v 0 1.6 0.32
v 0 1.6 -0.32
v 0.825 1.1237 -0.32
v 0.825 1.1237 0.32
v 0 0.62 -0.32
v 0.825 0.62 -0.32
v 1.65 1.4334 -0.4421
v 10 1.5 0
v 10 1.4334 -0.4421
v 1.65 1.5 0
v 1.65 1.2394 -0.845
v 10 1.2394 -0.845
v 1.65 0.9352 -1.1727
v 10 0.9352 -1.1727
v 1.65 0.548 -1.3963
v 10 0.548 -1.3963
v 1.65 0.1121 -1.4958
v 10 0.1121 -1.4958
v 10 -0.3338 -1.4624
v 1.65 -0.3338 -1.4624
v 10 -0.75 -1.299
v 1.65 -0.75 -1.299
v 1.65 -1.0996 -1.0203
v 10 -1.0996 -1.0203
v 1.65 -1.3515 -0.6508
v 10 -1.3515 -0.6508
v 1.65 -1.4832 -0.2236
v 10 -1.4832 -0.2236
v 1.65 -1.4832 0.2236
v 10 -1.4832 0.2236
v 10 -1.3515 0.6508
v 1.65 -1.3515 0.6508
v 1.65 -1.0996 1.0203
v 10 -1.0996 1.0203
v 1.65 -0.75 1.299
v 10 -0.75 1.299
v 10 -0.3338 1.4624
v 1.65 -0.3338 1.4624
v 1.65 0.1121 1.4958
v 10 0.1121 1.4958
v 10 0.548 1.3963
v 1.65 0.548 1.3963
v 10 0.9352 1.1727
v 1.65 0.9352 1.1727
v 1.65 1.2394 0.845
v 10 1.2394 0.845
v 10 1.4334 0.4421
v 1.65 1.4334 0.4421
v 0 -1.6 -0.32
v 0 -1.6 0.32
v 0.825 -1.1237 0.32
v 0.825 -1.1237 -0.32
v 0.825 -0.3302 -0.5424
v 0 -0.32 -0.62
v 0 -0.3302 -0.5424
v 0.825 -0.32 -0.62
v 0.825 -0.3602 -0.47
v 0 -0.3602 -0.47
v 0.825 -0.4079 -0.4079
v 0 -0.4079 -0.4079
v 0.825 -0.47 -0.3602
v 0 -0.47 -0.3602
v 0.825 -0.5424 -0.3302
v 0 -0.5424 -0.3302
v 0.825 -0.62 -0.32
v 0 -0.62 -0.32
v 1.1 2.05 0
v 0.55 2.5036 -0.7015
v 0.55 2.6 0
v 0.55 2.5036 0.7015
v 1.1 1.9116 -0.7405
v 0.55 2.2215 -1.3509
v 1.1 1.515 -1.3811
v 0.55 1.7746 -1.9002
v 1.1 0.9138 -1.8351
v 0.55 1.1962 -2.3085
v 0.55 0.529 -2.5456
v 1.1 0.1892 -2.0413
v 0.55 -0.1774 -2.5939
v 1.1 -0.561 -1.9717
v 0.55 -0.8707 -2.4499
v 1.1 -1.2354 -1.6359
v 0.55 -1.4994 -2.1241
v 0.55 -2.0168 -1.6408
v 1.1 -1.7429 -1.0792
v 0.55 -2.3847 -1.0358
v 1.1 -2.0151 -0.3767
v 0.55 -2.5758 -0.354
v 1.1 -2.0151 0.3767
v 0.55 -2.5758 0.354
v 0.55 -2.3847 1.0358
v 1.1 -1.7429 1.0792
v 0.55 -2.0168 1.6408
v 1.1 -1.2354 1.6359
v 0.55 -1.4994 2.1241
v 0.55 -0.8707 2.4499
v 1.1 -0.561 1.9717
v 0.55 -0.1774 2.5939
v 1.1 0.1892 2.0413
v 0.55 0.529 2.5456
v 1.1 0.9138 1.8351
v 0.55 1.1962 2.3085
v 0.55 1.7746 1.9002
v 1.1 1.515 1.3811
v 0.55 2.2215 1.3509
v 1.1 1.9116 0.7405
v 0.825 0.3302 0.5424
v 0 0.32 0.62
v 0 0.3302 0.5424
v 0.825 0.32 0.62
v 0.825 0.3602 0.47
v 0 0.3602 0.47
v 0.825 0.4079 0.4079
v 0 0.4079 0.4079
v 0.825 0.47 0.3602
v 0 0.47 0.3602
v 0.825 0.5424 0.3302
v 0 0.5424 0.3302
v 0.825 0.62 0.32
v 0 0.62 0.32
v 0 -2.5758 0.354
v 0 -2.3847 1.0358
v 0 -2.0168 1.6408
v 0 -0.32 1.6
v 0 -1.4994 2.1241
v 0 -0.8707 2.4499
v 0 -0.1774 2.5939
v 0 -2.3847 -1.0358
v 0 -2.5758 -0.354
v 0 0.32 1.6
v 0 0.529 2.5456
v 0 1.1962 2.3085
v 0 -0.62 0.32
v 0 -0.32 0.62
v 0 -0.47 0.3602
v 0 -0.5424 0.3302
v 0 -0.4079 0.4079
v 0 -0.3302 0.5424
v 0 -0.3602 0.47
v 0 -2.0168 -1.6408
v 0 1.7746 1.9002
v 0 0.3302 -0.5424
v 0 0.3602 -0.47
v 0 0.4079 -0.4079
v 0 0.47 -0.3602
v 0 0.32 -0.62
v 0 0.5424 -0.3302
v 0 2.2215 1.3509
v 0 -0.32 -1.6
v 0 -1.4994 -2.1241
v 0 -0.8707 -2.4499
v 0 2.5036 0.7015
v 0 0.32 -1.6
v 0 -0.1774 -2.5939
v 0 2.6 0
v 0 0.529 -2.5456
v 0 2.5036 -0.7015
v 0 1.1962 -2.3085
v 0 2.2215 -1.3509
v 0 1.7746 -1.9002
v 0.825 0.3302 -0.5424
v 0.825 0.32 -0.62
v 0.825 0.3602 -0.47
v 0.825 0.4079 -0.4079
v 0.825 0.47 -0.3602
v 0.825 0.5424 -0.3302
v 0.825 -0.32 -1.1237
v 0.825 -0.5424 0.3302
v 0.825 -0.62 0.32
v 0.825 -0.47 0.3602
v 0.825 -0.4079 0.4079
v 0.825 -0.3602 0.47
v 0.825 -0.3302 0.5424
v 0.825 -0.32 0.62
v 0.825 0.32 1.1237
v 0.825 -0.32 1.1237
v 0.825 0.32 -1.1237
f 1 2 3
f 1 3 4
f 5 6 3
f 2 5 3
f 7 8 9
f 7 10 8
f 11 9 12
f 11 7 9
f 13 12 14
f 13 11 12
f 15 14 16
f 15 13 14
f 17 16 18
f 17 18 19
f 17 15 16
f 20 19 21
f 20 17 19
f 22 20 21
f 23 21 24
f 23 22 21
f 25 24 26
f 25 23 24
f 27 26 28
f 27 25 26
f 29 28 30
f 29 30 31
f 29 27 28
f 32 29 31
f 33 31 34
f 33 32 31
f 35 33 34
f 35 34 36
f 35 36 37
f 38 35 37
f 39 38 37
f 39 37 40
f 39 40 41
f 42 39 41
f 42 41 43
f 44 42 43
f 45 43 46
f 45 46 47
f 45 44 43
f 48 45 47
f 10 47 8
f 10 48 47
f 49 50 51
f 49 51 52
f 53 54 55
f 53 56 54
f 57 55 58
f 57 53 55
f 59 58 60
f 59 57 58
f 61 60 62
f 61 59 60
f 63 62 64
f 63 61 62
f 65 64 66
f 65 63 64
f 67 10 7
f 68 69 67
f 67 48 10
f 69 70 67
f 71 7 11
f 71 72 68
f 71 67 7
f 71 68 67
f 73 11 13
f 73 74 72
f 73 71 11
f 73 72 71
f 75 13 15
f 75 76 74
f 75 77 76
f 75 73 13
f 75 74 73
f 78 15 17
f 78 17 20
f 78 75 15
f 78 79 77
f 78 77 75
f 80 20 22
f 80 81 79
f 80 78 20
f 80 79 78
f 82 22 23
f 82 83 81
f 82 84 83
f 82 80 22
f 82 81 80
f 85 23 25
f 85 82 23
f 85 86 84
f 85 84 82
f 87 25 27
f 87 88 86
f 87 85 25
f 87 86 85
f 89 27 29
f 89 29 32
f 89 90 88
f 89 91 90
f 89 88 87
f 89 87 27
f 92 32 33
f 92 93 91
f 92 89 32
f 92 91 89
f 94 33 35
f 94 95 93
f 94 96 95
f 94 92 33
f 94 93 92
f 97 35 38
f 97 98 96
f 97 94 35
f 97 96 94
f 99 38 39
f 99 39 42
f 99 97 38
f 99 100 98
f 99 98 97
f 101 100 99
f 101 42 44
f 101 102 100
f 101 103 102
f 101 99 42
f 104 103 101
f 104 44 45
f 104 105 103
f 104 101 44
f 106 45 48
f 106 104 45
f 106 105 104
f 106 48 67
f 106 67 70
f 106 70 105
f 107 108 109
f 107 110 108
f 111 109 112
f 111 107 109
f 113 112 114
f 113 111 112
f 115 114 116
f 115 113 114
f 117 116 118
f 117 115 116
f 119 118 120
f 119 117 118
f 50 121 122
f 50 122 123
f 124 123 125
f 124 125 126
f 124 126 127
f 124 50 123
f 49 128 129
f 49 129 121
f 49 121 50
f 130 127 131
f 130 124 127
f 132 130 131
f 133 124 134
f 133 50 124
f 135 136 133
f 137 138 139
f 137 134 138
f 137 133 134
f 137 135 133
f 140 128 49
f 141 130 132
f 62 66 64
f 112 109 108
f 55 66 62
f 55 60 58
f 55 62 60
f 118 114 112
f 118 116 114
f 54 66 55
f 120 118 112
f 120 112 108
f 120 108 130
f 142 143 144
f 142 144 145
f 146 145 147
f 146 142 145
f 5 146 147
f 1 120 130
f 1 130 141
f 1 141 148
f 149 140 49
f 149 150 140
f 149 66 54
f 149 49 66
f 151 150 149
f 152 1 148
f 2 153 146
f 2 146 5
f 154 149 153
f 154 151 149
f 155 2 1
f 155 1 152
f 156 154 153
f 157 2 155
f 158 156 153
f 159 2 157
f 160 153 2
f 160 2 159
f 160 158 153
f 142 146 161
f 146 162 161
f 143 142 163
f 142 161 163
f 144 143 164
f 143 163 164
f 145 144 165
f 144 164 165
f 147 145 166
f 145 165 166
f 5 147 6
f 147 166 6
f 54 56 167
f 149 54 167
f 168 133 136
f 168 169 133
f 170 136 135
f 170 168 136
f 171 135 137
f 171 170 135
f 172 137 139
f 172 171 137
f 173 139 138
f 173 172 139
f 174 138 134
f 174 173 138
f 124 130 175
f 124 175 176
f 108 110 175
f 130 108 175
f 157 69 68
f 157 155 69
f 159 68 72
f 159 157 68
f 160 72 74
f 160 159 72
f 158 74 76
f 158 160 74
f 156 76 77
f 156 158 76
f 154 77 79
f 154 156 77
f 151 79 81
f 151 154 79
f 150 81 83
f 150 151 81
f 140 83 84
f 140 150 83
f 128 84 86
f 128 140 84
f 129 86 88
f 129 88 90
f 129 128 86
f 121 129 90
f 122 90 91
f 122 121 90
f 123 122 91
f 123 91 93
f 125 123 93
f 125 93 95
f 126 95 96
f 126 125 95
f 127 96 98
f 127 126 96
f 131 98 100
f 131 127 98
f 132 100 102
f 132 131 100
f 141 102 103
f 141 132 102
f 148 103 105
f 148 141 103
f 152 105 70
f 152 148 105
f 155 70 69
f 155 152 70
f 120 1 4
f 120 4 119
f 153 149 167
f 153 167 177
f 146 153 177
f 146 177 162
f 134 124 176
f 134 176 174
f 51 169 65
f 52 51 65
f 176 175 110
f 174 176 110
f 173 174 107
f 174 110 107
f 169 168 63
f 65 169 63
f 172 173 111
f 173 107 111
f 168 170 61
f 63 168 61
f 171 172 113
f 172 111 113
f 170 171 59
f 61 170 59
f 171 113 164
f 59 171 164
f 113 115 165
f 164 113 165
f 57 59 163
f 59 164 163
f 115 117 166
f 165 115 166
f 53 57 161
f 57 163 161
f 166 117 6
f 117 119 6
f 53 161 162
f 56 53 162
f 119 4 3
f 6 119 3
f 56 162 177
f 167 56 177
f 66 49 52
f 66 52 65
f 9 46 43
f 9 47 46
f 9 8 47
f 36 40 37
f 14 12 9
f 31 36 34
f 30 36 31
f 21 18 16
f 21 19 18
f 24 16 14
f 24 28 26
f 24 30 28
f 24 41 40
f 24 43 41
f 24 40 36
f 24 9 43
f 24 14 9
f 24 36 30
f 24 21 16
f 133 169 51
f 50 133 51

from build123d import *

# Parameters (mm, degrees)
CROSSRECESS_DEPTH = 0.825
DRAFT9_ANGLE      = 30
FILLET5_R         = 0.3


with BuildPart() as part:
    # Sketch1 → Base (revolve)
    with BuildSketch(Plane.XY):
        Polygon((10, 1.5), (2.65, 1.5), (1.65, 1.5), (0.55, 2.6), (0, 2.6), (0, 0), (10, 0), align=None)
    revolve(axis=Axis((4.515812911, 0, 0), (-1, 0, 0)))

    # Sketch6 → CrossRecess (cut)
    with BuildSketch(Plane(origin=(0, 0, 0), x_dir=(0, 0, -1), z_dir=(1, 0, 0))):
        Polygon((0.32, 0.32), (0.32, 1.6), (-0.32, 1.6), (-0.32, 0.32), (-1.6, 0.32), (-1.6, -0.32), (-0.32, -0.32), (-0.32, -1.6), (0.32, -1.6), (0.32, -0.32), (1.6, -0.32), (1.6, 0.32), align=None)
    extrude(amount=CROSSRECESS_DEPTH, mode=Mode.SUBTRACT)

    # Draft9
    draft9_faces = [part.faces().sort_by_distance(p)[0] for p in [
        (0.4125, 1.6, 0),
        (0.4125, 0, 1.6),
        (0.4125, -1.6, 0),
        (0.4125, 0, -1.6),
    ]]
    draft(draft9_faces, Plane(origin=(0, 2.6, 0), x_dir=(0, 0, -1), z_dir=(-1, 0, 0)), DRAFT9_ANGLE)

    # Fillet5
    fillet5_edges = [part.edges().sort_by_distance(p)[0] for p in [
        (0.4125, 0.32, 0.32),
        (0.4125, -0.32, 0.32),
        (0.4125, -0.32, -0.32),
        (0.4125, 0.32, -0.32),
    ]]
    fillet(fillet5_edges, radius=FILLET5_R)


solid = part.part
